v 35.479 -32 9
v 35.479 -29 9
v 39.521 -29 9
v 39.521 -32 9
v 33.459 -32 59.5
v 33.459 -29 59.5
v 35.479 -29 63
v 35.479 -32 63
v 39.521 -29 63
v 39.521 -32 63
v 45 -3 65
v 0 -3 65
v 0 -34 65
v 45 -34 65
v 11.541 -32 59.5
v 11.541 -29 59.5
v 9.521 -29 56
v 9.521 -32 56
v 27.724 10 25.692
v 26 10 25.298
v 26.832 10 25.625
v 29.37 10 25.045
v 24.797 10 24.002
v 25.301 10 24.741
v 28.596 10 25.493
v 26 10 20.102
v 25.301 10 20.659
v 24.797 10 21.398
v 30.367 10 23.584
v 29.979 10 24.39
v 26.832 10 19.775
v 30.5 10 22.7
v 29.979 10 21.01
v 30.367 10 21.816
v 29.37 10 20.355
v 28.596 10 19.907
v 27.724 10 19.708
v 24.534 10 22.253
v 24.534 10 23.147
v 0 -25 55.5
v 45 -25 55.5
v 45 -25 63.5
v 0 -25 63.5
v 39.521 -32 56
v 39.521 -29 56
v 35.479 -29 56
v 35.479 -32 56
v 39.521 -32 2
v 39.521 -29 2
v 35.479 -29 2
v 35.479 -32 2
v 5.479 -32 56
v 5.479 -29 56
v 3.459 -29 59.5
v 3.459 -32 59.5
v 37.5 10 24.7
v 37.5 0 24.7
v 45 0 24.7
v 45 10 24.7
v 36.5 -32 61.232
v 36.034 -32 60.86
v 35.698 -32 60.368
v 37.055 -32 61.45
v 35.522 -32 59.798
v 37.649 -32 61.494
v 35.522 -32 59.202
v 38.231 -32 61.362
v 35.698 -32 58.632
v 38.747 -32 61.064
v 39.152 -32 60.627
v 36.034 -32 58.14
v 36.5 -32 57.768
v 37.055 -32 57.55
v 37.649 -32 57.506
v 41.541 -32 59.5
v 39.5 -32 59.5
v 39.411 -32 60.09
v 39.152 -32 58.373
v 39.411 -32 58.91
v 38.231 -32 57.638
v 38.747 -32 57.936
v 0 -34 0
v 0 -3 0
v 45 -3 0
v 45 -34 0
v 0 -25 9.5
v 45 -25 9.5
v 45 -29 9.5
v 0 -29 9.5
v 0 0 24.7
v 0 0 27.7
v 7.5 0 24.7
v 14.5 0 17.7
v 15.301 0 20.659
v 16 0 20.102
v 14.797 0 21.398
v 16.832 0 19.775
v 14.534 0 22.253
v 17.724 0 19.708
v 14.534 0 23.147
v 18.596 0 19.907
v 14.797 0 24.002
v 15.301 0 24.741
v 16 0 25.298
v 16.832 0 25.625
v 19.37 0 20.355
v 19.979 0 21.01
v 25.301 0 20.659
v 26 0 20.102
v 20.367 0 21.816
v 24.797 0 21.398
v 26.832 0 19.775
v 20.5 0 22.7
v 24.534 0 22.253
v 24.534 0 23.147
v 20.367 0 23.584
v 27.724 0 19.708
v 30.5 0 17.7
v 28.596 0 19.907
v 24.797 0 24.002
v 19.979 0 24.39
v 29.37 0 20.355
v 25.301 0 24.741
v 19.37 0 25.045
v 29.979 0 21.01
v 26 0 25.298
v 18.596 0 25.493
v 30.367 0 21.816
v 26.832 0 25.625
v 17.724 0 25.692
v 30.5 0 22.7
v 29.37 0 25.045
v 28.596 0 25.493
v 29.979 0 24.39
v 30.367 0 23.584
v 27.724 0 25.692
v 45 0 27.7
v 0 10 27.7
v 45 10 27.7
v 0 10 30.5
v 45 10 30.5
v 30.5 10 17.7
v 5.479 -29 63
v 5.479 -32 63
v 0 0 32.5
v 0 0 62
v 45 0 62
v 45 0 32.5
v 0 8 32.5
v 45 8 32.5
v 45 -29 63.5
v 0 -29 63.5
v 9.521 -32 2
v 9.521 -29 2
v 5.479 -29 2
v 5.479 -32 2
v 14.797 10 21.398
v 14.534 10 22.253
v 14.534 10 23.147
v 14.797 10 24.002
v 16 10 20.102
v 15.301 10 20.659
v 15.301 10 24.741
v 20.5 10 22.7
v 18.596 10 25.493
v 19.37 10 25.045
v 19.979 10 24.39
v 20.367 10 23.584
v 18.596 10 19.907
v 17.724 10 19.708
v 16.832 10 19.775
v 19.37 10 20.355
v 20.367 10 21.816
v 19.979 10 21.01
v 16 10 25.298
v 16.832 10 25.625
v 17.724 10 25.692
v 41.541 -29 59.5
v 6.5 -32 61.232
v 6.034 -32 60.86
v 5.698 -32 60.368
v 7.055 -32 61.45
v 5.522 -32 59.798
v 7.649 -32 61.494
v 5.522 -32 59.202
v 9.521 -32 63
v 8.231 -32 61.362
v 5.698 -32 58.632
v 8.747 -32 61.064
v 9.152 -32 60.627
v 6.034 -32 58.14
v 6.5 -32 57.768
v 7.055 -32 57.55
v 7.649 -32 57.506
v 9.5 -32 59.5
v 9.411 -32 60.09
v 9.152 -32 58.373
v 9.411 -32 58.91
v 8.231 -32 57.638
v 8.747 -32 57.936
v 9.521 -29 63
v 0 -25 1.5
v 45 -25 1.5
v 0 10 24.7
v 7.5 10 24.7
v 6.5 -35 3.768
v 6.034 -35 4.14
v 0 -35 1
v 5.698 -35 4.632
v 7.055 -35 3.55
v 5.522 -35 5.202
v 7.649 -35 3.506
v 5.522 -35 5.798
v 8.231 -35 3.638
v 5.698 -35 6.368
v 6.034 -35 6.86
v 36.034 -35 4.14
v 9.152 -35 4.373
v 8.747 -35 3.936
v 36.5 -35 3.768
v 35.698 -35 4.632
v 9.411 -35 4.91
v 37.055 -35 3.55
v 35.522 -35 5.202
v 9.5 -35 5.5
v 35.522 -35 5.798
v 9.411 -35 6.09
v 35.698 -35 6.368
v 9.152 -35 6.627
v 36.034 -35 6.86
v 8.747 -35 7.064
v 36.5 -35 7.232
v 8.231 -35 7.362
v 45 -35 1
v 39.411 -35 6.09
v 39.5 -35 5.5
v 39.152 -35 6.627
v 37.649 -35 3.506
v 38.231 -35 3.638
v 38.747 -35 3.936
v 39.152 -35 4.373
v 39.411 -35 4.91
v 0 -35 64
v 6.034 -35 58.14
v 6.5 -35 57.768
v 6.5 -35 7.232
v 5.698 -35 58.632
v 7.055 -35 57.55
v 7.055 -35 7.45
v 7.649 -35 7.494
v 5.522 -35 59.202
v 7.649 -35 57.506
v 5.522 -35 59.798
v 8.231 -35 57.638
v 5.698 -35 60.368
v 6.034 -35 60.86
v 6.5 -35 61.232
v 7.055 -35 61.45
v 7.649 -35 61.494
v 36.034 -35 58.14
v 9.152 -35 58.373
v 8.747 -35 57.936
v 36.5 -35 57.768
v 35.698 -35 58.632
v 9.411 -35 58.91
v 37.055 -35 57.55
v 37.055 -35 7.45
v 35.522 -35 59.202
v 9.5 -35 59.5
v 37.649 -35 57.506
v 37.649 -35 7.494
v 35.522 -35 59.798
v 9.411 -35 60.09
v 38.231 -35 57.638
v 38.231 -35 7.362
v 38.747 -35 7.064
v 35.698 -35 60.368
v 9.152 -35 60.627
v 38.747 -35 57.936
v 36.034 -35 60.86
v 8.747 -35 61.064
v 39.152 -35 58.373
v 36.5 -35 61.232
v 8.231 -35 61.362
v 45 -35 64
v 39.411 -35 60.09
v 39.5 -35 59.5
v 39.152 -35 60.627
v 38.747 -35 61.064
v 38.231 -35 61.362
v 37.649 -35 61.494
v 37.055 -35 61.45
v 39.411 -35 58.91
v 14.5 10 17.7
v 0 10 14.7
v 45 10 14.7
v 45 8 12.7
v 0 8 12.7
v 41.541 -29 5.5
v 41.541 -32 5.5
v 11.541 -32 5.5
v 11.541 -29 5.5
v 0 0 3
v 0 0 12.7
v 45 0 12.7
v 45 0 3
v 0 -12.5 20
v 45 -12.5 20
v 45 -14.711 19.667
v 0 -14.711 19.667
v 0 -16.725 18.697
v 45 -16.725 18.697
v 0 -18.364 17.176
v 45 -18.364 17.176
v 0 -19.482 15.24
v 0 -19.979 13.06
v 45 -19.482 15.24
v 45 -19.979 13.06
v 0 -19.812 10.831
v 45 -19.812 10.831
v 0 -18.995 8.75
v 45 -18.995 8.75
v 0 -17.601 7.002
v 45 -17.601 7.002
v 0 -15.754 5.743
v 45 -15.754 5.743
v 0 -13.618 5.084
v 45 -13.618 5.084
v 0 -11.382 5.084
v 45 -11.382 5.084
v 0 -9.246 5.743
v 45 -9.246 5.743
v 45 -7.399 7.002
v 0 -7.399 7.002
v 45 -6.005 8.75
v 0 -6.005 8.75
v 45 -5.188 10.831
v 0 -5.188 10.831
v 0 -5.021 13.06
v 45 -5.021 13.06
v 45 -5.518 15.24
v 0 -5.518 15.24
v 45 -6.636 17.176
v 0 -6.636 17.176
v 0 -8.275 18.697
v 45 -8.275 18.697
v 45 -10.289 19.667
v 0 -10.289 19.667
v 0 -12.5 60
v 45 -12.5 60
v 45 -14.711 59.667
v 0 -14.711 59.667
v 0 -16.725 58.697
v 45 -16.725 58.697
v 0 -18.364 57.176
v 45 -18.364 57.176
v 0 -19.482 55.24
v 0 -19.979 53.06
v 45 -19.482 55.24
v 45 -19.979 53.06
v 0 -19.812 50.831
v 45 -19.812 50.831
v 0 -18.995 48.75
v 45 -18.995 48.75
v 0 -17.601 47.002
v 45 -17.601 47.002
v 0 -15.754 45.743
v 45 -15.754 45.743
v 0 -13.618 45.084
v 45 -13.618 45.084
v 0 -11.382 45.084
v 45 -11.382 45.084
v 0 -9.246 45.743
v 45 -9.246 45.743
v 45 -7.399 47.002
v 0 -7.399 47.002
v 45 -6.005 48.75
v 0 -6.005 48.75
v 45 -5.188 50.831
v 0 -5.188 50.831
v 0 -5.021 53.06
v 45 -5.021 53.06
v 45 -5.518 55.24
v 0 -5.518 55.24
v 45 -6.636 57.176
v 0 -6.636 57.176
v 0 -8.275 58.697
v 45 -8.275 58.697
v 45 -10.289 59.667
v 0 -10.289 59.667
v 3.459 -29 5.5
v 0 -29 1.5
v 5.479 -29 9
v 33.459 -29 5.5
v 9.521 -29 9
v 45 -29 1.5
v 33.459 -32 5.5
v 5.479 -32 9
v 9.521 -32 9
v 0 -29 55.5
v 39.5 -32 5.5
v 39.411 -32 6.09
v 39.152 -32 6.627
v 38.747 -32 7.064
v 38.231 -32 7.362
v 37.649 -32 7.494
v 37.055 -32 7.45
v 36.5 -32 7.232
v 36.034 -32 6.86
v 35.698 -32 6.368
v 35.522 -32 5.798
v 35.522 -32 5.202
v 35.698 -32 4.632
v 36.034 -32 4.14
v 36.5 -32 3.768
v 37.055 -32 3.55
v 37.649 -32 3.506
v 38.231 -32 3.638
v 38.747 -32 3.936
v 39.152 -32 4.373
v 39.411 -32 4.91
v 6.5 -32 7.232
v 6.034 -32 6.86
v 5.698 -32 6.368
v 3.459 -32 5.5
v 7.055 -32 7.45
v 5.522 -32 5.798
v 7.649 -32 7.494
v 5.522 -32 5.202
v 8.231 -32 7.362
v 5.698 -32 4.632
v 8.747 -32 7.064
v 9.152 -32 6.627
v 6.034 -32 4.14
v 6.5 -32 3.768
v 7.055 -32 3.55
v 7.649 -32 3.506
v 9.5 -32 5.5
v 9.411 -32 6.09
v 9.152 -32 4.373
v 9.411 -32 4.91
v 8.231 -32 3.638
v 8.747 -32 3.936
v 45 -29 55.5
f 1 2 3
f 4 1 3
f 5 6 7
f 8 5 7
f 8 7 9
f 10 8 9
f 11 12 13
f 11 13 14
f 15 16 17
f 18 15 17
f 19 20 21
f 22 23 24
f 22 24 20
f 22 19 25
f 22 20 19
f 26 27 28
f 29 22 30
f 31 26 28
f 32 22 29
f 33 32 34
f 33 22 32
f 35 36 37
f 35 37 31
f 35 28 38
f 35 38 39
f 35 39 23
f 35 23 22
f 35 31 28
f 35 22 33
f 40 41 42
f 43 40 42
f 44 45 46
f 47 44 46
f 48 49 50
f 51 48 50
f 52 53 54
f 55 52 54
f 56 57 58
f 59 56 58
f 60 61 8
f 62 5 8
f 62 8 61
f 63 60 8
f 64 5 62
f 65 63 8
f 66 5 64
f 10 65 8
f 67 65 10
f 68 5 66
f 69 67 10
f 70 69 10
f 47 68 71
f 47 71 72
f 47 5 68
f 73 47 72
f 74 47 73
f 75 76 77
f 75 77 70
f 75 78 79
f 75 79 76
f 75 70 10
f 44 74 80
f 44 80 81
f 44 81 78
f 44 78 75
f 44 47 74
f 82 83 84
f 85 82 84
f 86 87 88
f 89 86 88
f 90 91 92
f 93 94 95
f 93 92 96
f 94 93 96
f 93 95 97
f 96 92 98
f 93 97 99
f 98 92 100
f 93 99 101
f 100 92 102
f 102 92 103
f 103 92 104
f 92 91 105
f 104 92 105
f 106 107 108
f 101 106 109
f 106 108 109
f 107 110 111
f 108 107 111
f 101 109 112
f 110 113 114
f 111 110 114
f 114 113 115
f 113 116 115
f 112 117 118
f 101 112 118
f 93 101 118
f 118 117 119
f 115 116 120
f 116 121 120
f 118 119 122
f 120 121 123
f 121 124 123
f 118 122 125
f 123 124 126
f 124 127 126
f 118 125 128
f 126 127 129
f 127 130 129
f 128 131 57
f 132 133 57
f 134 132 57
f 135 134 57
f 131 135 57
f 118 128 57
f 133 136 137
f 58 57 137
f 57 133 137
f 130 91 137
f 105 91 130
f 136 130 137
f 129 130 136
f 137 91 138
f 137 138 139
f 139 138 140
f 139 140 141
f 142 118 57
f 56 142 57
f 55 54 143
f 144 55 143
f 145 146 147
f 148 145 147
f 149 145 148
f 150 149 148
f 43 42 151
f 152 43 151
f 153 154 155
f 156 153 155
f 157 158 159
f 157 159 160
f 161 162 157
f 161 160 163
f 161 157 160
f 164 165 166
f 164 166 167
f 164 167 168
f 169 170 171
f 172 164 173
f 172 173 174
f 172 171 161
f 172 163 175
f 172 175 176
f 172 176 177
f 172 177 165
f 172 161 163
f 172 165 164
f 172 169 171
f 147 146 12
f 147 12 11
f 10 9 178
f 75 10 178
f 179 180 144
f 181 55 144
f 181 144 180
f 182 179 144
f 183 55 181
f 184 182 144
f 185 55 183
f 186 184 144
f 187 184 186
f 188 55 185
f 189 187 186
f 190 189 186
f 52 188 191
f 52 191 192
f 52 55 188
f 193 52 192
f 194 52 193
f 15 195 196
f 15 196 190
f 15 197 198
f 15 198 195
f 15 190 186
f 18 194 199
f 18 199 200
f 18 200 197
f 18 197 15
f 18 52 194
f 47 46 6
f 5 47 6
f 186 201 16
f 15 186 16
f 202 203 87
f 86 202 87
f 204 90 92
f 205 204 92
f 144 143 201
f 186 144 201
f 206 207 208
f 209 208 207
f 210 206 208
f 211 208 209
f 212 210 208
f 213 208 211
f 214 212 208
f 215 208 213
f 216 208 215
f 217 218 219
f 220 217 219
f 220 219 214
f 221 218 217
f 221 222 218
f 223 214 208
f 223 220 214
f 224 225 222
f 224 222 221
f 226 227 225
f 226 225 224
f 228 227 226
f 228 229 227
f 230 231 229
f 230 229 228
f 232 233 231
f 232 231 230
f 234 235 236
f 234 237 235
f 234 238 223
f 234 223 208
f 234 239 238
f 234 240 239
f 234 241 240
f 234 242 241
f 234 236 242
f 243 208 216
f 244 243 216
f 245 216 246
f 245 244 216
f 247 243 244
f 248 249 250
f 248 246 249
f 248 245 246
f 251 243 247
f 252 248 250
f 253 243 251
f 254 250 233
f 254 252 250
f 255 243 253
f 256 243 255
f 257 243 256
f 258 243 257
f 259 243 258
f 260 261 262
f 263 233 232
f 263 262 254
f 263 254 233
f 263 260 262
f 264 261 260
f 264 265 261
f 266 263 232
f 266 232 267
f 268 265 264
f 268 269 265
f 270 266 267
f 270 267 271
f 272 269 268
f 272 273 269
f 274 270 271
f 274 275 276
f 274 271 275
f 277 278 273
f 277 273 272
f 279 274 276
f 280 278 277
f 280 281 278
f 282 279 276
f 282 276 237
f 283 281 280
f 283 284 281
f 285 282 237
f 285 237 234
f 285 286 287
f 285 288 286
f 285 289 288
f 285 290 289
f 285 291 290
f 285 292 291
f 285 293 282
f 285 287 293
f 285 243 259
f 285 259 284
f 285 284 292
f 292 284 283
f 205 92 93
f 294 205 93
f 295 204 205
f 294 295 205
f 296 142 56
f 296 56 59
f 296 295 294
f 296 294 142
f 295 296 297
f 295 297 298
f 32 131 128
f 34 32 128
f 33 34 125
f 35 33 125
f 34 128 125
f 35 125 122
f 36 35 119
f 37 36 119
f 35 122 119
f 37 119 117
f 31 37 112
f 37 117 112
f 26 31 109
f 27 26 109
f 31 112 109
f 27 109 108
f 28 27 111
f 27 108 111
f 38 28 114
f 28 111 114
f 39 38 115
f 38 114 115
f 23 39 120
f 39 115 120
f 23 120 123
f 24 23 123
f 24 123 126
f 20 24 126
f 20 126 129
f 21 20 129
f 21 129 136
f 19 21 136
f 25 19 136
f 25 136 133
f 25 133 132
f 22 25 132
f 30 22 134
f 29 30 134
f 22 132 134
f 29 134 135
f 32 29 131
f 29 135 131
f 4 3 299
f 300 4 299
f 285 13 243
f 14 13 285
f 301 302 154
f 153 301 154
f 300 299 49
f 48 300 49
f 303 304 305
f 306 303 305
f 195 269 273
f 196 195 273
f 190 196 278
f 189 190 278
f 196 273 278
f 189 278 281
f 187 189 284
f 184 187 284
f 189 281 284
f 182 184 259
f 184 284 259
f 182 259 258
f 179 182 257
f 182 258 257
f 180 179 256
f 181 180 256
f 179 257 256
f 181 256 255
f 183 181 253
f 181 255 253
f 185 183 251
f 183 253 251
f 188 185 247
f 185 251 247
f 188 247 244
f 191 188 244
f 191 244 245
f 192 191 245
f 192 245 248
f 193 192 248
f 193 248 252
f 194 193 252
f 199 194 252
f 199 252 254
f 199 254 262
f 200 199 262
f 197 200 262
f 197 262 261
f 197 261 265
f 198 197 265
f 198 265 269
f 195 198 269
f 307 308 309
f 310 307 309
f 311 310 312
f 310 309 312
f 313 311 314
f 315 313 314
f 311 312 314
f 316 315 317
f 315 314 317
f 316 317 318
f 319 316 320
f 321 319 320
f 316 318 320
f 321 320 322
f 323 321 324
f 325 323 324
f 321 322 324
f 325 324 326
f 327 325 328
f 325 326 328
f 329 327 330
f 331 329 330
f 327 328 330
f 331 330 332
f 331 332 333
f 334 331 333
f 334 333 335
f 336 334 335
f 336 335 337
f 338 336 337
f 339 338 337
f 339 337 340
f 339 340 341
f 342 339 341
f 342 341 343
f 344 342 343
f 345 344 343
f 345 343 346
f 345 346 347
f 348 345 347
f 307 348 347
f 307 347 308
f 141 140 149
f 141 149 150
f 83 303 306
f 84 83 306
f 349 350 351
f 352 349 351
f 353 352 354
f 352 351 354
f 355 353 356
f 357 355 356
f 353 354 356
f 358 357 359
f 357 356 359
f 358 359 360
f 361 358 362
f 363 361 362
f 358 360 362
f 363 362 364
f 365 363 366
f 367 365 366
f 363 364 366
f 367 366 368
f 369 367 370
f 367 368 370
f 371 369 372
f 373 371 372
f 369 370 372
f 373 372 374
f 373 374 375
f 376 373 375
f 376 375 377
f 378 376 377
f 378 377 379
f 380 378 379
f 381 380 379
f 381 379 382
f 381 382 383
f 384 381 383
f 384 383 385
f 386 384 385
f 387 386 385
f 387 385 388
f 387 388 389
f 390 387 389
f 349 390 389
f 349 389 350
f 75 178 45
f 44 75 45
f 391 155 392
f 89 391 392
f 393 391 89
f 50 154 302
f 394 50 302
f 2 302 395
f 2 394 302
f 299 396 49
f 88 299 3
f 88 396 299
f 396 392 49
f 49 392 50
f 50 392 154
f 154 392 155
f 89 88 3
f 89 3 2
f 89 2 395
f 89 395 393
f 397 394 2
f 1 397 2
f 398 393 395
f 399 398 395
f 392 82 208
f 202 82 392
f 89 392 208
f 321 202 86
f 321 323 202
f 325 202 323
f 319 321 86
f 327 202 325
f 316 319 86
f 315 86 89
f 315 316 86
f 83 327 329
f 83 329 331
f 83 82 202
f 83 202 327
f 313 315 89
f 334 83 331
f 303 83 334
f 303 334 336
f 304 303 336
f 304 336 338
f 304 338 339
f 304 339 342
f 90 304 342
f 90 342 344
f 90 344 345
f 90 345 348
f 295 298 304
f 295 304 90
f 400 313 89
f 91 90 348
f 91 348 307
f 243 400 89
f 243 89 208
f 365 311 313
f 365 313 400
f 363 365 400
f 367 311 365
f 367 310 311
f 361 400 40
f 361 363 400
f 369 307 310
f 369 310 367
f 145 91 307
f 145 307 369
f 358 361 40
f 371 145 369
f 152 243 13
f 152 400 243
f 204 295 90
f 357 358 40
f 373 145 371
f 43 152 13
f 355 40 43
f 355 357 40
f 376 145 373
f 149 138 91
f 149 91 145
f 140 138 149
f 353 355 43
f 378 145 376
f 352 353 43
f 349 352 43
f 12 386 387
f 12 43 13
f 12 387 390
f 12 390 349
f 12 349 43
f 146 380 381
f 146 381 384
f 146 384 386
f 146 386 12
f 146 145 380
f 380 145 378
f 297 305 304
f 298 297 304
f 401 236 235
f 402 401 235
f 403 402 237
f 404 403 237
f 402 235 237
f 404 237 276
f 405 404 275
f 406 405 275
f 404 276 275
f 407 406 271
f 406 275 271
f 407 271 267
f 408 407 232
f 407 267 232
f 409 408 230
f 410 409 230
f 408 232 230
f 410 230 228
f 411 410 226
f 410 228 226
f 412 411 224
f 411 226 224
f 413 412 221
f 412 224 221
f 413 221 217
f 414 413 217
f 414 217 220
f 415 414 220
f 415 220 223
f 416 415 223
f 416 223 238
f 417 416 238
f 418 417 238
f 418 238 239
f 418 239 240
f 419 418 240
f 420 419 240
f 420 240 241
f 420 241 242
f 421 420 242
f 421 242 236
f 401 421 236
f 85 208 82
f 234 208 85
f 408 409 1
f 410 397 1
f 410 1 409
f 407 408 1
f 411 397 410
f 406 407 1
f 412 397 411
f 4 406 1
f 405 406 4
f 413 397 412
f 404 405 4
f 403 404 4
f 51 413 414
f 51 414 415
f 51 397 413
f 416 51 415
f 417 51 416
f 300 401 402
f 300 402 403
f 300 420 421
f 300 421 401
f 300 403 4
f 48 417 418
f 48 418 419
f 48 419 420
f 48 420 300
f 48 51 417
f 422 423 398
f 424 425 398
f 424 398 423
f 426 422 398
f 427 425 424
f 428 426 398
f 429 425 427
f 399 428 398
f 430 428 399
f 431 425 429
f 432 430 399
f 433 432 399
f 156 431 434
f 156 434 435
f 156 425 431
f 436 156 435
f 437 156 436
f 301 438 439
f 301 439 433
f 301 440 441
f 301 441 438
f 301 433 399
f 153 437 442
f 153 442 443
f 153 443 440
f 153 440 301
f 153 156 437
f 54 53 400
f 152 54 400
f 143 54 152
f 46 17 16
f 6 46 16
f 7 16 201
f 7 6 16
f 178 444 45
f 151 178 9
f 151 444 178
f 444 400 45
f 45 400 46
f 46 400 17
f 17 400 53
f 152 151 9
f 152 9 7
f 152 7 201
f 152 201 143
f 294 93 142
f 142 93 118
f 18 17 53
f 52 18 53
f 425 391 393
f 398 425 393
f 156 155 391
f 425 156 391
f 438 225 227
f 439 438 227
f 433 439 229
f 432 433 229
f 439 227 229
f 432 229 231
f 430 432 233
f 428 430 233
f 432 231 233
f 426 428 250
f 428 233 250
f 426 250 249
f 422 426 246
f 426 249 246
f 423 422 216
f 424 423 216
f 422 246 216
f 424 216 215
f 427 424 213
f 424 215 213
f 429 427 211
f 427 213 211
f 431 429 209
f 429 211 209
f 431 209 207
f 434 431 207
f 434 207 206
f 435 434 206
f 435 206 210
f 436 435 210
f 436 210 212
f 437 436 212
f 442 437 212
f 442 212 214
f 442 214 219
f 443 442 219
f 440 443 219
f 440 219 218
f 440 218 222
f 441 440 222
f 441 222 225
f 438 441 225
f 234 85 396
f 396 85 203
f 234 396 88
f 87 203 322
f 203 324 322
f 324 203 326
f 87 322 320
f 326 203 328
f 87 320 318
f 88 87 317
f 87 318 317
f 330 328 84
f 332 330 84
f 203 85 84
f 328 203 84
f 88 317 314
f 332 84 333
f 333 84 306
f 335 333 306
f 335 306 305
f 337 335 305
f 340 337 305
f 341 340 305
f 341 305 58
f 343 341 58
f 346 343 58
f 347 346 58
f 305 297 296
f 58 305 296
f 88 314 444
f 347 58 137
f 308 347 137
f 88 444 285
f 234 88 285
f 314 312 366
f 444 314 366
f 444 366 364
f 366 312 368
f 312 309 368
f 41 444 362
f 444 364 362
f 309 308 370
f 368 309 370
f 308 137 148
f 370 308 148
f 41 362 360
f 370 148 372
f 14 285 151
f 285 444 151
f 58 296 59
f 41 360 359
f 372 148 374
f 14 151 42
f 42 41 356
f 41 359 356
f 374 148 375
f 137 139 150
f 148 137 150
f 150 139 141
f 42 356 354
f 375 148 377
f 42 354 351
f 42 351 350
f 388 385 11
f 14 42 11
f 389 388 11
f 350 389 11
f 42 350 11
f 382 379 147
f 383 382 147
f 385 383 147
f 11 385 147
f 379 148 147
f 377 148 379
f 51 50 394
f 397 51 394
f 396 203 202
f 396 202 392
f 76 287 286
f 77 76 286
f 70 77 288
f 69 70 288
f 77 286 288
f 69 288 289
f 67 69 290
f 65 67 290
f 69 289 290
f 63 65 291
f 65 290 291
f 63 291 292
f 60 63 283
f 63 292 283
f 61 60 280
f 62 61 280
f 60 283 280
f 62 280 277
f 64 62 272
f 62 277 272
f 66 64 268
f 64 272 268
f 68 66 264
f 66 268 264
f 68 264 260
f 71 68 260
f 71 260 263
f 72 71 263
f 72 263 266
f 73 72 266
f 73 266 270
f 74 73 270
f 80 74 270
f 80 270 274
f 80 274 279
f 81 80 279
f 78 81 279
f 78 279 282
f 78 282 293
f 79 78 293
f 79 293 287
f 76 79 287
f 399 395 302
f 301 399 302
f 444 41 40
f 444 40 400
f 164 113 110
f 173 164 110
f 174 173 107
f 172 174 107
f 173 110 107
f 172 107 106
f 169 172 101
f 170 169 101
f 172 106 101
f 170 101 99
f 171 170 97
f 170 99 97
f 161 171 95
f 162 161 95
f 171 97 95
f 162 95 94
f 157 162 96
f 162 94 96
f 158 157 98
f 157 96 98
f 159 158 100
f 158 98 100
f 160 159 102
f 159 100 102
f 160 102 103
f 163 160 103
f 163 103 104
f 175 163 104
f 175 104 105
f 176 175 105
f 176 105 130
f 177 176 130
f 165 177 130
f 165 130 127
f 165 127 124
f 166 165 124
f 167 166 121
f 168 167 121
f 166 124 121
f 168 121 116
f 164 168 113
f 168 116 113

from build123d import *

# Parameters (mm, degrees)
SKETCH_W        = 45
SKETCH_H        = 65
PAD_DEPTH       = 35
SKETCH001_R     = 7.5
POCKET_DEPTH    = 45.001
SKETCH002_R     = 2
POCKET001_DEPTH = 6
SKETCH003_W     = 8
SKETCH003_H     = 4
POCKET002_DEPTH = 45.001
POCKET003_DEPTH = 3
SKETCH005_R     = 3
SKETCH005_W     = 45
SKETCH005_H     = 4.8
PAD001_DEPTH    = 10
CHAMFER_SIZE    = 1
CHAMFER001_SIZE = 3
CHAMFER002_SIZE = 2


with BuildPart() as part:
    # Sketch → Pad (new body)
    with BuildSketch(Plane.XZ):
        with Locations((22.5, 32.5)):
            Rectangle(SKETCH_W, SKETCH_H)
    extrude(amount=PAD_DEPTH)

    # Sketch001 (on Face2 of Pad) → Pocket (cut, through all)
    with BuildSketch(Plane(origin=(45, 0, 0), x_dir=(0, 0, 1), z_dir=(1, 0, 0))):
        with Locations((52.5, 12.5)):
            Circle(SKETCH001_R)
        with Locations((12.5, 12.5)):
            Circle(SKETCH001_R)
    extrude(amount=-POCKET_DEPTH, mode=Mode.SUBTRACT)

    # Sketch002 (on Face6 of Pad) → Pocket001 (cut)
    with BuildSketch(Plane.XZ.offset(35)):
        with Locations((7.5, 59.5)):
            Circle(SKETCH002_R)
        with Locations((37.5, 59.5)):
            Circle(SKETCH002_R)
        with Locations((7.5, 5.5)):
            Circle(SKETCH002_R)
        with Locations((37.5, 5.5)):
            Circle(SKETCH002_R)
    extrude(amount=-POCKET001_DEPTH, mode=Mode.SUBTRACT)

    # Sketch003 (on Face3 of Pocket001) → Pocket002 (cut, through all)
    with BuildSketch(Plane(origin=(45, 0, 0), x_dir=(0, 0, 1), z_dir=(1, 0, 0))):
        with Locations((5.5, 27)):
            Rectangle(SKETCH003_W, SKETCH003_H)
        with Locations((59.5, 27)):
            Rectangle(SKETCH003_W, SKETCH003_H)
    extrude(amount=-POCKET002_DEPTH, mode=Mode.SUBTRACT)

    # Sketch004 (on Face14 of Pocket002) → Pocket003 (cut)
    with BuildSketch(Plane(origin=(0, -29, 0), x_dir=(1, 0, 0), z_dir=(0, 1, 0))):
        Polygon((11.541452, -5.5), (9.520726, -2), (5.479274, -2), (3.458548, -5.5), (5.479274, -9), (9.520726, -9), align=None)
        Polygon((39.520726, -9), (41.541452, -5.5), (39.520726, -2), (35.479274, -2), (33.458548, -5.5), (35.479274, -9), align=None)
        Polygon((9.520726, -63), (11.541452, -59.5), (9.520726, -56), (5.479274, -56), (3.458548, -59.5), (5.479274, -63), align=None)
        Polygon((39.520726, -63), (41.541452, -59.5), (39.520726, -56), (35.479274, -56), (33.458548, -59.5), (35.479274, -63), align=None)
    extrude(amount=-POCKET003_DEPTH, mode=Mode.SUBTRACT)

    # Sketch005 (on Face4 of Pocket003) → Pad001 (join)
    with BuildSketch(Plane(origin=(0, 0, 0), x_dir=(1, 0, 0), z_dir=(0, 1, 0))):
        with Locations((27.5, -22.7)):
            Circle(SKETCH005_R)
        with Locations((17.5, -22.7)):
            Circle(SKETCH005_R)
        Polygon((45, -24.7), (45, -12.7), (0, -12.7), (0, -24.7), (7.5, -24.7), (14.5, -17.7), (30.5, -17.7), (37.5, -24.7), align=None)
        with Locations((22.5, -30.1)):
            Rectangle(SKETCH005_W, SKETCH005_H)
    extrude(amount=PAD001_DEPTH)

    # Chamfer
    chamfer_edges = [part.edges().sort_by_distance(p)[0] for p in [
        (22.5, -35, 65),
        (22.5, -35, 0),
    ]]
    chamfer(chamfer_edges, length=CHAMFER_SIZE)

    # Chamfer001
    chamfer001_edges = [part.edges().sort_by_distance(p)[0] for p in [
        (22.5, 0, 65),
        (22.5, 0, 0),
    ]]
    chamfer(chamfer001_edges, length=CHAMFER001_SIZE)

    # Chamfer002
    chamfer002_edges = [part.edges().sort_by_distance(p)[0] for p in [
        (22.5, 10, 32.5),
        (22.5, 10, 12.7),
    ]]
    chamfer(chamfer002_edges, length=CHAMFER002_SIZE)


solid = part.part
